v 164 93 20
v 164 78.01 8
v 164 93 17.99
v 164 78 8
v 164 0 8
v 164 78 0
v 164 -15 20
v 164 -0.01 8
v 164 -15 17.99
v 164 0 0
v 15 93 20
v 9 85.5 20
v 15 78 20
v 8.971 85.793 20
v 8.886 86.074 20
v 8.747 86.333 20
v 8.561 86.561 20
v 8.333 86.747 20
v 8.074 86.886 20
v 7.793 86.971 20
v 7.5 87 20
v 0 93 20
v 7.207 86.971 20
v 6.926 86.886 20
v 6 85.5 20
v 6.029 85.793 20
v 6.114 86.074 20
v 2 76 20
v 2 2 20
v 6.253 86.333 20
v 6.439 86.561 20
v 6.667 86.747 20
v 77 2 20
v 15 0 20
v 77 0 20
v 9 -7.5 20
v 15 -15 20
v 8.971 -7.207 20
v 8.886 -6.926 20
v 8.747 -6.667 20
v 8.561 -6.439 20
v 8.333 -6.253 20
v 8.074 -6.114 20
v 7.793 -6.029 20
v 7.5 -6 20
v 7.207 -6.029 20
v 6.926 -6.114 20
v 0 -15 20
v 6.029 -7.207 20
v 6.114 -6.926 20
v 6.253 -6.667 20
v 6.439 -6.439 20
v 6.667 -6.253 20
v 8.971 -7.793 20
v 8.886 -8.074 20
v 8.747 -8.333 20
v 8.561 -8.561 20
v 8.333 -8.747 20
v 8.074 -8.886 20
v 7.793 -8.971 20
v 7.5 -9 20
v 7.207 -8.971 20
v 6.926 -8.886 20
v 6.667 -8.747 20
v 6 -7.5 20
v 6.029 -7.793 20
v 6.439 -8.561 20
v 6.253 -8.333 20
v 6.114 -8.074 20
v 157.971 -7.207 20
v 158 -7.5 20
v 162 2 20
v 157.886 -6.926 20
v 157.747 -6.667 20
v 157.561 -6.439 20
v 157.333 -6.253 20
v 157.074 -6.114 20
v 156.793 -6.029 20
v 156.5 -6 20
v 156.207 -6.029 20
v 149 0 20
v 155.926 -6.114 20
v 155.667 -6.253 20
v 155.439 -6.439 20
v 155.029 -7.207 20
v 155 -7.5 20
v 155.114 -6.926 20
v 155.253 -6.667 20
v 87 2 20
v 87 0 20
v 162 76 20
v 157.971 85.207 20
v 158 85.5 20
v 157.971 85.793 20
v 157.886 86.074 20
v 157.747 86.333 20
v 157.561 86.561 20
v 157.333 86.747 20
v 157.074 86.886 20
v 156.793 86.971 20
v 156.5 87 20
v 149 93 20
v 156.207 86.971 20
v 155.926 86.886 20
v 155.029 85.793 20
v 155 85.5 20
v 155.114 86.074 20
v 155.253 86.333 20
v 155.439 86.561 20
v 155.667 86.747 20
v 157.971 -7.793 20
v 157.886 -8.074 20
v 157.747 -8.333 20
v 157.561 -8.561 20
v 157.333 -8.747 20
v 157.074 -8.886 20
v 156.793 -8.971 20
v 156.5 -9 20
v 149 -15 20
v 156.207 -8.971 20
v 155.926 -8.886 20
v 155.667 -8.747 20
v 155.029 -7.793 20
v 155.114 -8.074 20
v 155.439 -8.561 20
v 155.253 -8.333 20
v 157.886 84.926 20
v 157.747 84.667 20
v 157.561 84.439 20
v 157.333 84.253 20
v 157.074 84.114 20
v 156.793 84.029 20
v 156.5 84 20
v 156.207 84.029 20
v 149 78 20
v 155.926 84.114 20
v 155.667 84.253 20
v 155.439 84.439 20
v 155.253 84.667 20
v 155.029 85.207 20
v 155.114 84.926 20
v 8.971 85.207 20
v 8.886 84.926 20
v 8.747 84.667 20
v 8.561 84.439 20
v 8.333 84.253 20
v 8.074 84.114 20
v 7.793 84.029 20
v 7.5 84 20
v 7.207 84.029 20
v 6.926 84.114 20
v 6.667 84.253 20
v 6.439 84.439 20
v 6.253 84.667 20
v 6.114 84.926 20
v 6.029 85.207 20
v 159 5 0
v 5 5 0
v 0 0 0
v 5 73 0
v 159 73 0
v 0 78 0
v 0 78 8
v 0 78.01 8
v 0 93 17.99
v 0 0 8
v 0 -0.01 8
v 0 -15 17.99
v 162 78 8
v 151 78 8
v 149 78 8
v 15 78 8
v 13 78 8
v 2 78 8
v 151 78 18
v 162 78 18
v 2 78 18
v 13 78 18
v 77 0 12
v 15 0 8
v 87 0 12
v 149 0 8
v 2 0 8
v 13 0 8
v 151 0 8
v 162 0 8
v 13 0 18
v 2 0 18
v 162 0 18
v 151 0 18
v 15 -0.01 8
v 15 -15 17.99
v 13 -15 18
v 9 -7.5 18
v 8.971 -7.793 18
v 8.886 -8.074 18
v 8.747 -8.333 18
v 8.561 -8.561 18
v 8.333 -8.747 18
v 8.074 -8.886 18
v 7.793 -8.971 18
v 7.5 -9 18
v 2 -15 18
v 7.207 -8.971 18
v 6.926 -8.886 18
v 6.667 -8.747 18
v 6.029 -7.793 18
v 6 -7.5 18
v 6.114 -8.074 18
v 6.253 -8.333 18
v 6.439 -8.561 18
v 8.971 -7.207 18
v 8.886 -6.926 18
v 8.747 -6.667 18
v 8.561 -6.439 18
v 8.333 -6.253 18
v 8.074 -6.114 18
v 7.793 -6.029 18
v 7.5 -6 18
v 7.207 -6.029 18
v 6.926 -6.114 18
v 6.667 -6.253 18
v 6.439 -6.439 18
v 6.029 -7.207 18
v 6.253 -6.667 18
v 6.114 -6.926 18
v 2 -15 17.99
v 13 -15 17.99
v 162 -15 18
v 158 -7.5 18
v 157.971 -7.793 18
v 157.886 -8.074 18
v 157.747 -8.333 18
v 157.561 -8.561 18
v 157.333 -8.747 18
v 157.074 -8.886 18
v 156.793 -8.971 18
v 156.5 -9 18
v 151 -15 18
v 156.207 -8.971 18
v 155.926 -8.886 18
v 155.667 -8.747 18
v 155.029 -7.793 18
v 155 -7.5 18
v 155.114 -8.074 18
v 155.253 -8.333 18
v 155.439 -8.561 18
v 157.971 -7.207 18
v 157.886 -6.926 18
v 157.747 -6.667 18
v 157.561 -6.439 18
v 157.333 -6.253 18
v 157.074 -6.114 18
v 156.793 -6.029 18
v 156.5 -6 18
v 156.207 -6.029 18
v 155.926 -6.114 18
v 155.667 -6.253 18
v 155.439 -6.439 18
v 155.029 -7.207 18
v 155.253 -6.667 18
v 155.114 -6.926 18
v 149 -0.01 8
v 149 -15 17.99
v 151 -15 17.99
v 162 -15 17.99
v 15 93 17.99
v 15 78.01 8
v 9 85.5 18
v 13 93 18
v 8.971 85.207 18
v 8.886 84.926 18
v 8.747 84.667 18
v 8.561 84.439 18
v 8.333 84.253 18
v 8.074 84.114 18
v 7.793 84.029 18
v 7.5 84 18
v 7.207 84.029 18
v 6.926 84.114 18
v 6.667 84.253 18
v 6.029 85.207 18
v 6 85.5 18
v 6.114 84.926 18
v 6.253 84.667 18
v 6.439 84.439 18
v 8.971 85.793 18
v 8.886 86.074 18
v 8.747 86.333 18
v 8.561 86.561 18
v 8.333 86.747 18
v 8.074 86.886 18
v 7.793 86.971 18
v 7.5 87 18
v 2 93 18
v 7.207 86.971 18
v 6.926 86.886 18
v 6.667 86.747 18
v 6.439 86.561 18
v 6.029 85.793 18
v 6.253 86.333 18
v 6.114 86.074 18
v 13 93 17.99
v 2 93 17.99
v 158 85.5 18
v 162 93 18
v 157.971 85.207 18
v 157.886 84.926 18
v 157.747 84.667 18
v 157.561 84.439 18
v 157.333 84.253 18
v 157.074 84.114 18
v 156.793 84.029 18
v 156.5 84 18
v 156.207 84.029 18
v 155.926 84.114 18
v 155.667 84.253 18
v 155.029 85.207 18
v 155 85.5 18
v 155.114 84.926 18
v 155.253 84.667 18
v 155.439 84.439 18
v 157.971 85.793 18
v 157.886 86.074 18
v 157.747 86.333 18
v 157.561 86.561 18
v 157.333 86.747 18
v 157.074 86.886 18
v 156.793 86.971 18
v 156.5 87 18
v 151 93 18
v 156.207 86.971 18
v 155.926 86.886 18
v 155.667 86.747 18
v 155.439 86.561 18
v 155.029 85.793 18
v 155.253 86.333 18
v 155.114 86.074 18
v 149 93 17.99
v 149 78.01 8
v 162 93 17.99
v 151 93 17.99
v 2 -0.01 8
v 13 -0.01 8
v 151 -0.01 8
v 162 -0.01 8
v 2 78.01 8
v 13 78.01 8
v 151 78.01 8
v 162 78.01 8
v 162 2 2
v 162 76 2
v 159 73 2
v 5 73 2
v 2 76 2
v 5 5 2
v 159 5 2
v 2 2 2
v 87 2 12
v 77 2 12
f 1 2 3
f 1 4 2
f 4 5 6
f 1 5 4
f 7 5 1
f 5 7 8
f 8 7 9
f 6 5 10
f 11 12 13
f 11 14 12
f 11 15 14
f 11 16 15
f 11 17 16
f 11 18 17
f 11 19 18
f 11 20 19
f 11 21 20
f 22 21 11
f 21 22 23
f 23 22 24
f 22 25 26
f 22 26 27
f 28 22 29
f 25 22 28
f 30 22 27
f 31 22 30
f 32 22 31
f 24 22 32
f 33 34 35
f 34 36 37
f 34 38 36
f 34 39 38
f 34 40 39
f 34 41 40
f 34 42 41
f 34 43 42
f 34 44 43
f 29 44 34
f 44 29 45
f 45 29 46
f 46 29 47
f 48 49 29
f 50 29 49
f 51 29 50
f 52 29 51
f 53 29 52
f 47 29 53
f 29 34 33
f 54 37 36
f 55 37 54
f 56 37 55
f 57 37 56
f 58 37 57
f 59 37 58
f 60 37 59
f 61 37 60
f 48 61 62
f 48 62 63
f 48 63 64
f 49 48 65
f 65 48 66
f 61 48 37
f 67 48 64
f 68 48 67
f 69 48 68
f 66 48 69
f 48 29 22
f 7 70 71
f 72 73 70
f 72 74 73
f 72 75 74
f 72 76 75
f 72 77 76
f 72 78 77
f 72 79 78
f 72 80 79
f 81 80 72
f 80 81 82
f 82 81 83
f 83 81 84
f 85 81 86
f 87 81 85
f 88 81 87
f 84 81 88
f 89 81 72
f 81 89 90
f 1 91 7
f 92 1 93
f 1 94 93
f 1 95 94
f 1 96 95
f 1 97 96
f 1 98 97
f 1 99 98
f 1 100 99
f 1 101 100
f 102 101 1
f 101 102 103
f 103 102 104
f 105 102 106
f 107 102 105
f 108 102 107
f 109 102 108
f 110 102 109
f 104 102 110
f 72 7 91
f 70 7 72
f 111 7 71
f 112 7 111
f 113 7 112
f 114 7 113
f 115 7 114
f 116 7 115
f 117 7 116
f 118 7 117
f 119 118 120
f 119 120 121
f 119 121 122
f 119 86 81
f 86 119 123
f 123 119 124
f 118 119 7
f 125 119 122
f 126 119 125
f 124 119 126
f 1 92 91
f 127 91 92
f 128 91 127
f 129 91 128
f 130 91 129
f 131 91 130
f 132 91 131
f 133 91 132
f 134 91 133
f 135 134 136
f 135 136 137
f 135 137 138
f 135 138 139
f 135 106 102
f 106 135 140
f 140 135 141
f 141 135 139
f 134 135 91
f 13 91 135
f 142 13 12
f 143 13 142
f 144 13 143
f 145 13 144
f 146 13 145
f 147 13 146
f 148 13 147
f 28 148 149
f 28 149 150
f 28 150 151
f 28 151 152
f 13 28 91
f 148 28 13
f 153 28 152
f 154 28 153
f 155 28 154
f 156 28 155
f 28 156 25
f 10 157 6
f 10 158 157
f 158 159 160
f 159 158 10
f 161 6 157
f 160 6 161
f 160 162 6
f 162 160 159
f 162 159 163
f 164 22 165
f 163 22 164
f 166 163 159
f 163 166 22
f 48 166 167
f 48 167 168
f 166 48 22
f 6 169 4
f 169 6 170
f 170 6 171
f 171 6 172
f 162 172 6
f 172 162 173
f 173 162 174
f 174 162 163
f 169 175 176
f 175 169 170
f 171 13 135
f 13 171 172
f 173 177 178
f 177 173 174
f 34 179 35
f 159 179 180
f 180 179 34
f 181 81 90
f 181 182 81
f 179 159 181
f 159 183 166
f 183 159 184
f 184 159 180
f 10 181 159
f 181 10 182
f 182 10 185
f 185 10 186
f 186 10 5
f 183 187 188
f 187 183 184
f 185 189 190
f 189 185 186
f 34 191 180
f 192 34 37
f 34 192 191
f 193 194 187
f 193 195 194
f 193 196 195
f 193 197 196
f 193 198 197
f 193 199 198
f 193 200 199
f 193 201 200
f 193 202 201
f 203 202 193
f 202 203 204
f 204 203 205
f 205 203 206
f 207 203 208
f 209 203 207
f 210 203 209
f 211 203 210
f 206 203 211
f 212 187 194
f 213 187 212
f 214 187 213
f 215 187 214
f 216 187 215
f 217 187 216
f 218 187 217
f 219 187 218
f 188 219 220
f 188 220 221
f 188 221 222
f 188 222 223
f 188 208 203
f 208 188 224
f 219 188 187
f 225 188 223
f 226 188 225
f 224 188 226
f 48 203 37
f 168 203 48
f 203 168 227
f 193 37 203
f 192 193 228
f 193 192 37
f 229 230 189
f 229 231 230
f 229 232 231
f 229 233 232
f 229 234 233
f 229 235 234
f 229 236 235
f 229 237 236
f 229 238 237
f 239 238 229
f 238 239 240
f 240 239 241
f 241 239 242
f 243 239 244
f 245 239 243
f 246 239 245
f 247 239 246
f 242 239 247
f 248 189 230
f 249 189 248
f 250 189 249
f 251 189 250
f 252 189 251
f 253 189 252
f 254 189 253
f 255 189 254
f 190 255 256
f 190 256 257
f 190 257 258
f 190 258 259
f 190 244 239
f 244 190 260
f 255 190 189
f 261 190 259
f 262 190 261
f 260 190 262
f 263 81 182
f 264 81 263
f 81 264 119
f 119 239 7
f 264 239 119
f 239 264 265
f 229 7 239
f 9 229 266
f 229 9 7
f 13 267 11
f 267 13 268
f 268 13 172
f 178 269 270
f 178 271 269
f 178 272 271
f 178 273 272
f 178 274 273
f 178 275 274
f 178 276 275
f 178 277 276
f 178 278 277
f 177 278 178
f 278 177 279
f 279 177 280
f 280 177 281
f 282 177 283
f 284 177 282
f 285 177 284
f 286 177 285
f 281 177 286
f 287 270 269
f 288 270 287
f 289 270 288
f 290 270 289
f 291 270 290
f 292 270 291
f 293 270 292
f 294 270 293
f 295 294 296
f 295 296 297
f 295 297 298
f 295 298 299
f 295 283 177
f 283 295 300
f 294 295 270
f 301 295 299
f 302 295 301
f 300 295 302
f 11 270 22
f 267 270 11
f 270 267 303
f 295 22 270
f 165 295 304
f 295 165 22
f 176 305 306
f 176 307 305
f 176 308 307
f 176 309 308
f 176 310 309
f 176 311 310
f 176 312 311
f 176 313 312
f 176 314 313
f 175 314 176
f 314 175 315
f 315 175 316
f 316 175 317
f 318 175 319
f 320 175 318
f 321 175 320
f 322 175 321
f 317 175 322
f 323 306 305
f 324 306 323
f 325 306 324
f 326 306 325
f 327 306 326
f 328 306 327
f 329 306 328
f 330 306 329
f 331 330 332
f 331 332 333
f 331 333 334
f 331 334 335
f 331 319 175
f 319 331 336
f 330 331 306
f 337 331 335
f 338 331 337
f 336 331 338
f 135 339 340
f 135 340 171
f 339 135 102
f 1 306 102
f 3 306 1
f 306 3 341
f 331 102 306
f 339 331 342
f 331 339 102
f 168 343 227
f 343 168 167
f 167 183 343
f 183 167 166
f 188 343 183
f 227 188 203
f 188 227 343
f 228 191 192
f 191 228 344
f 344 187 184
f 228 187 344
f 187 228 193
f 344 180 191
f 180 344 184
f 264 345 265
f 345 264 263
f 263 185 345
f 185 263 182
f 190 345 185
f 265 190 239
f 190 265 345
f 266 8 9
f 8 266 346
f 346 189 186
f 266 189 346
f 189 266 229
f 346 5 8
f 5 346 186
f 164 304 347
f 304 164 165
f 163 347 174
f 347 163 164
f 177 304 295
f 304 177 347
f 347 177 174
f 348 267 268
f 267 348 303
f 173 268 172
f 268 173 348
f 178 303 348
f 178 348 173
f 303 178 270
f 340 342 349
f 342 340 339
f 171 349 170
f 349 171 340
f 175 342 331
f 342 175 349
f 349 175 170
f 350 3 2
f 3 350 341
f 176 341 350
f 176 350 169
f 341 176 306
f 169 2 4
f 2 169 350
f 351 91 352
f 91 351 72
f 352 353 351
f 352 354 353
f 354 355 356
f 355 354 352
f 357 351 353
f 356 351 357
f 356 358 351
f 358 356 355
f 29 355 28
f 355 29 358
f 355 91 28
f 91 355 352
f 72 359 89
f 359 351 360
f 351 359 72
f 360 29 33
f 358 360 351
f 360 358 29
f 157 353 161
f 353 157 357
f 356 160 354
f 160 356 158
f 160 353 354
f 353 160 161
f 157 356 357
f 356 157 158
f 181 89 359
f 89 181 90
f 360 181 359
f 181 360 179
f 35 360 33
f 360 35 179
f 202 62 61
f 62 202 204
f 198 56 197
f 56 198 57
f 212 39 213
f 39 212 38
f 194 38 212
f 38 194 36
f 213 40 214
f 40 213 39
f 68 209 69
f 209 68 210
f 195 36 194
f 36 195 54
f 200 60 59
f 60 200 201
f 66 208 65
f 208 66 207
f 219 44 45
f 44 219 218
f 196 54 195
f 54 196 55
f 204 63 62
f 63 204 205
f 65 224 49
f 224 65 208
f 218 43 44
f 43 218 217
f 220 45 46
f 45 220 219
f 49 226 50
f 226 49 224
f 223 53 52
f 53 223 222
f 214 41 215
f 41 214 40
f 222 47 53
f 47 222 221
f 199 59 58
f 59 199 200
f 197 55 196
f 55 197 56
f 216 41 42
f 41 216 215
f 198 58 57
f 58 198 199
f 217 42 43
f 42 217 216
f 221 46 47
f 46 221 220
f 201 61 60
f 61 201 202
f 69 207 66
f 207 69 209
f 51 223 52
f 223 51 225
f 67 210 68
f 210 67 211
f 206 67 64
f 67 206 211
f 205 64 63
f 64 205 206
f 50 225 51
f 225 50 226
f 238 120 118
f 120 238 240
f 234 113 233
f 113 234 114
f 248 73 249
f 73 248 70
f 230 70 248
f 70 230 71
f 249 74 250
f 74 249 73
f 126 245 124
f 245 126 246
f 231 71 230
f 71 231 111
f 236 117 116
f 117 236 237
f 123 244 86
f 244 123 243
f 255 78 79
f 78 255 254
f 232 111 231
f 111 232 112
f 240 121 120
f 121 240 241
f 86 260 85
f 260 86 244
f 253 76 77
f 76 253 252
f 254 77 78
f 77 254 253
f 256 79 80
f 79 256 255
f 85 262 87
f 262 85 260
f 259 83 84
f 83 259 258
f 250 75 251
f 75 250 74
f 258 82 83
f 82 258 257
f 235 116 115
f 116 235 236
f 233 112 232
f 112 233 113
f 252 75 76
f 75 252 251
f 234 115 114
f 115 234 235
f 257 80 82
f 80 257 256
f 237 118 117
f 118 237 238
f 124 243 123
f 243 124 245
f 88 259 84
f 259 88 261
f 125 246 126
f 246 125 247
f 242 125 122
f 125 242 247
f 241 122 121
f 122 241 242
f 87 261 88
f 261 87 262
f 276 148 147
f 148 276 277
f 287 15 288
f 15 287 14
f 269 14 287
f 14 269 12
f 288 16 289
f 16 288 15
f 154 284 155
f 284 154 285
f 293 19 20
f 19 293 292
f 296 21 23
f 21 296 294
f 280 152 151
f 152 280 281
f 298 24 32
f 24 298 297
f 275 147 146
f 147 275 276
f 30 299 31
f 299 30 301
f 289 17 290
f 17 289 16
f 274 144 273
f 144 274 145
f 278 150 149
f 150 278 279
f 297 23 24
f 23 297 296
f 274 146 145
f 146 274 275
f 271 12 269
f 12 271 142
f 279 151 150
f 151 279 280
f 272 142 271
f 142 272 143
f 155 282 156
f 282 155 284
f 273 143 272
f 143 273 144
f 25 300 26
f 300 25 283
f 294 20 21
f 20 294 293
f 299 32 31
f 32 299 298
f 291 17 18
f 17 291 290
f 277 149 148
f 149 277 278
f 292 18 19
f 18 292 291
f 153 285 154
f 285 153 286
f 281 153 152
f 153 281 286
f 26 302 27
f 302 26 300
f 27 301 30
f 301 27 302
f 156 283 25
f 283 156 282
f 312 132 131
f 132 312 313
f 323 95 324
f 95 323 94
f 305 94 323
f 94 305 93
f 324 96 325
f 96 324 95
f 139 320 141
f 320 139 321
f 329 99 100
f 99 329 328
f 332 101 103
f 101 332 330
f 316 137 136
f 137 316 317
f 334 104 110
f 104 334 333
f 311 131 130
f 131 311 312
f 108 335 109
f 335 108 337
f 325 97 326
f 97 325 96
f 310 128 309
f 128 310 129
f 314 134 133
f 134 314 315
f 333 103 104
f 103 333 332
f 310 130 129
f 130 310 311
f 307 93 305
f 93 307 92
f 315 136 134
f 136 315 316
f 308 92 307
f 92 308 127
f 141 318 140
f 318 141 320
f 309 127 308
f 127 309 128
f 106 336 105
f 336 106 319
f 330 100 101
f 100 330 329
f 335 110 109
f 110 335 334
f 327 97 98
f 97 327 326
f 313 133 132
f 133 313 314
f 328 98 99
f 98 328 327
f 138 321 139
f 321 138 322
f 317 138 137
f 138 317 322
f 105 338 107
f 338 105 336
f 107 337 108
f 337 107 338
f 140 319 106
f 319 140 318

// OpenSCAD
// Box enclosure for 160x74x18mm object

// Inner dimensions (the object to enclose)
inner_length = 160;
inner_width = 74;
inner_height = 18;

// Wall thickness
wall = 2;

// Bottom hole inset from inner walls
hole_inset = 3;

// Side hole dimensions
side_hole_width = 10;
side_hole_height = 8;

// Overhang dimensions
overhang_width = 15;
overhang_length = 15;

// Screw hole diameter
screw_hole_d = 3;

// Gusset dimensions
gusset_thickness = 2;
gusset_height = 10;

// Outer dimensions
outer_length = inner_length + 2 * wall;
outer_width = inner_width + 2 * wall;
outer_height = inner_height + wall; // wall on bottom only, open top

// Bottom hole dimensions
hole_length = inner_length - 2 * hole_inset;
hole_width = inner_width - 2 * hole_inset;

// Overhang positions along X (flush to edges)
overhang_x1 = 0;
overhang_x2 = outer_length - overhang_width;

// Gusset module: right-triangle brace
module gusset(length, height, thickness) {
    hull() {
        cube([thickness, 0.01, height]);
        translate([0, length - 0.01, height - 0.01])
            cube([thickness, 0.01, 0.01]);
    }
}

difference() {
    union() {
        // Outer shell
        cube([outer_length, outer_width, outer_height]);

        // Left side overhangs (Y=0, extending in -Y)
        translate([overhang_x1, -overhang_length, outer_height - wall])
            cube([overhang_width, overhang_length, wall]);
        translate([overhang_x2, -overhang_length, outer_height - wall])
            cube([overhang_width, overhang_length, wall]);

        // Right side overhangs (Y=outer_width, extending in +Y)
        translate([overhang_x1, outer_width, outer_height - wall])
            cube([overhang_width, overhang_length, wall]);
        translate([overhang_x2, outer_width, outer_height - wall])
            cube([overhang_width, overhang_length, wall]);

        // Gussets - left side, front overhang
        translate([overhang_x1, 0, outer_height - wall - gusset_height])
            mirror([0, 1, 0])
                gusset(overhang_length, gusset_height, gusset_thickness);
        translate([overhang_x1 + overhang_width - gusset_thickness, 0, outer_height - wall - gusset_height])
            mirror([0, 1, 0])
                gusset(overhang_length, gusset_height, gusset_thickness);

        // Gussets - left side, rear overhang
        translate([overhang_x2, 0, outer_height - wall - gusset_height])
            mirror([0, 1, 0])
                gusset(overhang_length, gusset_height, gusset_thickness);
        translate([overhang_x2 + overhang_width - gusset_thickness, 0, outer_height - wall - gusset_height])
            mirror([0, 1, 0])
                gusset(overhang_length, gusset_height, gusset_thickness);

        // Gussets - right side, front overhang
        translate([overhang_x1, outer_width, outer_height - wall - gusset_height])
            gusset(overhang_length, gusset_height, gusset_thickness);
        translate([overhang_x1 + overhang_width - gusset_thickness, outer_width, outer_height - wall - gusset_height])
            gusset(overhang_length, gusset_height, gusset_thickness);

        // Gussets - right side, rear overhang
        translate([overhang_x2, outer_width, outer_height - wall - gusset_height])
            gusset(overhang_length, gusset_height, gusset_thickness);
        translate([overhang_x2 + overhang_width - gusset_thickness, outer_width, outer_height - wall - gusset_height])
            gusset(overhang_length, gusset_height, gusset_thickness);
    }

    // Inner cavity
    translate([wall, wall, wall])
        cube([inner_length, inner_width, inner_height + 1]);

    // Square hole in the bottom
    translate([wall + hole_inset, wall + hole_inset, -1])
        cube([hole_length, hole_width, wall + 2]);

    // Hole on the long side (front), centered horizontally, near top edge
    translate([outer_length / 2 - side_hole_width / 2, -1, outer_height - side_hole_height])
        cube([side_hole_width, wall + 2, side_hole_height + 1]);

    // Screw holes in overhangs - left side
    translate([overhang_x1 + overhang_width / 2, -overhang_length / 2, outer_height - wall - 1])
        cylinder(h = wall + 2, d = screw_hole_d, $fn = 32);
    translate([overhang_x2 + overhang_width / 2, -overhang_length / 2, outer_height - wall - 1])
        cylinder(h = wall + 2, d = screw_hole_d, $fn = 32);

    // Screw holes in overhangs - right side
    translate([overhang_x1 + overhang_width / 2, outer_width + overhang_length / 2, outer_height - wall - 1])
        cylinder(h = wall + 2, d = screw_hole_d, $fn = 32);
    translate([overhang_x2 + overhang_width / 2, outer_width + overhang_length / 2, outer_height - wall - 1])
        cylinder(h = wall + 2, d = screw_hole_d, $fn = 32);
}
